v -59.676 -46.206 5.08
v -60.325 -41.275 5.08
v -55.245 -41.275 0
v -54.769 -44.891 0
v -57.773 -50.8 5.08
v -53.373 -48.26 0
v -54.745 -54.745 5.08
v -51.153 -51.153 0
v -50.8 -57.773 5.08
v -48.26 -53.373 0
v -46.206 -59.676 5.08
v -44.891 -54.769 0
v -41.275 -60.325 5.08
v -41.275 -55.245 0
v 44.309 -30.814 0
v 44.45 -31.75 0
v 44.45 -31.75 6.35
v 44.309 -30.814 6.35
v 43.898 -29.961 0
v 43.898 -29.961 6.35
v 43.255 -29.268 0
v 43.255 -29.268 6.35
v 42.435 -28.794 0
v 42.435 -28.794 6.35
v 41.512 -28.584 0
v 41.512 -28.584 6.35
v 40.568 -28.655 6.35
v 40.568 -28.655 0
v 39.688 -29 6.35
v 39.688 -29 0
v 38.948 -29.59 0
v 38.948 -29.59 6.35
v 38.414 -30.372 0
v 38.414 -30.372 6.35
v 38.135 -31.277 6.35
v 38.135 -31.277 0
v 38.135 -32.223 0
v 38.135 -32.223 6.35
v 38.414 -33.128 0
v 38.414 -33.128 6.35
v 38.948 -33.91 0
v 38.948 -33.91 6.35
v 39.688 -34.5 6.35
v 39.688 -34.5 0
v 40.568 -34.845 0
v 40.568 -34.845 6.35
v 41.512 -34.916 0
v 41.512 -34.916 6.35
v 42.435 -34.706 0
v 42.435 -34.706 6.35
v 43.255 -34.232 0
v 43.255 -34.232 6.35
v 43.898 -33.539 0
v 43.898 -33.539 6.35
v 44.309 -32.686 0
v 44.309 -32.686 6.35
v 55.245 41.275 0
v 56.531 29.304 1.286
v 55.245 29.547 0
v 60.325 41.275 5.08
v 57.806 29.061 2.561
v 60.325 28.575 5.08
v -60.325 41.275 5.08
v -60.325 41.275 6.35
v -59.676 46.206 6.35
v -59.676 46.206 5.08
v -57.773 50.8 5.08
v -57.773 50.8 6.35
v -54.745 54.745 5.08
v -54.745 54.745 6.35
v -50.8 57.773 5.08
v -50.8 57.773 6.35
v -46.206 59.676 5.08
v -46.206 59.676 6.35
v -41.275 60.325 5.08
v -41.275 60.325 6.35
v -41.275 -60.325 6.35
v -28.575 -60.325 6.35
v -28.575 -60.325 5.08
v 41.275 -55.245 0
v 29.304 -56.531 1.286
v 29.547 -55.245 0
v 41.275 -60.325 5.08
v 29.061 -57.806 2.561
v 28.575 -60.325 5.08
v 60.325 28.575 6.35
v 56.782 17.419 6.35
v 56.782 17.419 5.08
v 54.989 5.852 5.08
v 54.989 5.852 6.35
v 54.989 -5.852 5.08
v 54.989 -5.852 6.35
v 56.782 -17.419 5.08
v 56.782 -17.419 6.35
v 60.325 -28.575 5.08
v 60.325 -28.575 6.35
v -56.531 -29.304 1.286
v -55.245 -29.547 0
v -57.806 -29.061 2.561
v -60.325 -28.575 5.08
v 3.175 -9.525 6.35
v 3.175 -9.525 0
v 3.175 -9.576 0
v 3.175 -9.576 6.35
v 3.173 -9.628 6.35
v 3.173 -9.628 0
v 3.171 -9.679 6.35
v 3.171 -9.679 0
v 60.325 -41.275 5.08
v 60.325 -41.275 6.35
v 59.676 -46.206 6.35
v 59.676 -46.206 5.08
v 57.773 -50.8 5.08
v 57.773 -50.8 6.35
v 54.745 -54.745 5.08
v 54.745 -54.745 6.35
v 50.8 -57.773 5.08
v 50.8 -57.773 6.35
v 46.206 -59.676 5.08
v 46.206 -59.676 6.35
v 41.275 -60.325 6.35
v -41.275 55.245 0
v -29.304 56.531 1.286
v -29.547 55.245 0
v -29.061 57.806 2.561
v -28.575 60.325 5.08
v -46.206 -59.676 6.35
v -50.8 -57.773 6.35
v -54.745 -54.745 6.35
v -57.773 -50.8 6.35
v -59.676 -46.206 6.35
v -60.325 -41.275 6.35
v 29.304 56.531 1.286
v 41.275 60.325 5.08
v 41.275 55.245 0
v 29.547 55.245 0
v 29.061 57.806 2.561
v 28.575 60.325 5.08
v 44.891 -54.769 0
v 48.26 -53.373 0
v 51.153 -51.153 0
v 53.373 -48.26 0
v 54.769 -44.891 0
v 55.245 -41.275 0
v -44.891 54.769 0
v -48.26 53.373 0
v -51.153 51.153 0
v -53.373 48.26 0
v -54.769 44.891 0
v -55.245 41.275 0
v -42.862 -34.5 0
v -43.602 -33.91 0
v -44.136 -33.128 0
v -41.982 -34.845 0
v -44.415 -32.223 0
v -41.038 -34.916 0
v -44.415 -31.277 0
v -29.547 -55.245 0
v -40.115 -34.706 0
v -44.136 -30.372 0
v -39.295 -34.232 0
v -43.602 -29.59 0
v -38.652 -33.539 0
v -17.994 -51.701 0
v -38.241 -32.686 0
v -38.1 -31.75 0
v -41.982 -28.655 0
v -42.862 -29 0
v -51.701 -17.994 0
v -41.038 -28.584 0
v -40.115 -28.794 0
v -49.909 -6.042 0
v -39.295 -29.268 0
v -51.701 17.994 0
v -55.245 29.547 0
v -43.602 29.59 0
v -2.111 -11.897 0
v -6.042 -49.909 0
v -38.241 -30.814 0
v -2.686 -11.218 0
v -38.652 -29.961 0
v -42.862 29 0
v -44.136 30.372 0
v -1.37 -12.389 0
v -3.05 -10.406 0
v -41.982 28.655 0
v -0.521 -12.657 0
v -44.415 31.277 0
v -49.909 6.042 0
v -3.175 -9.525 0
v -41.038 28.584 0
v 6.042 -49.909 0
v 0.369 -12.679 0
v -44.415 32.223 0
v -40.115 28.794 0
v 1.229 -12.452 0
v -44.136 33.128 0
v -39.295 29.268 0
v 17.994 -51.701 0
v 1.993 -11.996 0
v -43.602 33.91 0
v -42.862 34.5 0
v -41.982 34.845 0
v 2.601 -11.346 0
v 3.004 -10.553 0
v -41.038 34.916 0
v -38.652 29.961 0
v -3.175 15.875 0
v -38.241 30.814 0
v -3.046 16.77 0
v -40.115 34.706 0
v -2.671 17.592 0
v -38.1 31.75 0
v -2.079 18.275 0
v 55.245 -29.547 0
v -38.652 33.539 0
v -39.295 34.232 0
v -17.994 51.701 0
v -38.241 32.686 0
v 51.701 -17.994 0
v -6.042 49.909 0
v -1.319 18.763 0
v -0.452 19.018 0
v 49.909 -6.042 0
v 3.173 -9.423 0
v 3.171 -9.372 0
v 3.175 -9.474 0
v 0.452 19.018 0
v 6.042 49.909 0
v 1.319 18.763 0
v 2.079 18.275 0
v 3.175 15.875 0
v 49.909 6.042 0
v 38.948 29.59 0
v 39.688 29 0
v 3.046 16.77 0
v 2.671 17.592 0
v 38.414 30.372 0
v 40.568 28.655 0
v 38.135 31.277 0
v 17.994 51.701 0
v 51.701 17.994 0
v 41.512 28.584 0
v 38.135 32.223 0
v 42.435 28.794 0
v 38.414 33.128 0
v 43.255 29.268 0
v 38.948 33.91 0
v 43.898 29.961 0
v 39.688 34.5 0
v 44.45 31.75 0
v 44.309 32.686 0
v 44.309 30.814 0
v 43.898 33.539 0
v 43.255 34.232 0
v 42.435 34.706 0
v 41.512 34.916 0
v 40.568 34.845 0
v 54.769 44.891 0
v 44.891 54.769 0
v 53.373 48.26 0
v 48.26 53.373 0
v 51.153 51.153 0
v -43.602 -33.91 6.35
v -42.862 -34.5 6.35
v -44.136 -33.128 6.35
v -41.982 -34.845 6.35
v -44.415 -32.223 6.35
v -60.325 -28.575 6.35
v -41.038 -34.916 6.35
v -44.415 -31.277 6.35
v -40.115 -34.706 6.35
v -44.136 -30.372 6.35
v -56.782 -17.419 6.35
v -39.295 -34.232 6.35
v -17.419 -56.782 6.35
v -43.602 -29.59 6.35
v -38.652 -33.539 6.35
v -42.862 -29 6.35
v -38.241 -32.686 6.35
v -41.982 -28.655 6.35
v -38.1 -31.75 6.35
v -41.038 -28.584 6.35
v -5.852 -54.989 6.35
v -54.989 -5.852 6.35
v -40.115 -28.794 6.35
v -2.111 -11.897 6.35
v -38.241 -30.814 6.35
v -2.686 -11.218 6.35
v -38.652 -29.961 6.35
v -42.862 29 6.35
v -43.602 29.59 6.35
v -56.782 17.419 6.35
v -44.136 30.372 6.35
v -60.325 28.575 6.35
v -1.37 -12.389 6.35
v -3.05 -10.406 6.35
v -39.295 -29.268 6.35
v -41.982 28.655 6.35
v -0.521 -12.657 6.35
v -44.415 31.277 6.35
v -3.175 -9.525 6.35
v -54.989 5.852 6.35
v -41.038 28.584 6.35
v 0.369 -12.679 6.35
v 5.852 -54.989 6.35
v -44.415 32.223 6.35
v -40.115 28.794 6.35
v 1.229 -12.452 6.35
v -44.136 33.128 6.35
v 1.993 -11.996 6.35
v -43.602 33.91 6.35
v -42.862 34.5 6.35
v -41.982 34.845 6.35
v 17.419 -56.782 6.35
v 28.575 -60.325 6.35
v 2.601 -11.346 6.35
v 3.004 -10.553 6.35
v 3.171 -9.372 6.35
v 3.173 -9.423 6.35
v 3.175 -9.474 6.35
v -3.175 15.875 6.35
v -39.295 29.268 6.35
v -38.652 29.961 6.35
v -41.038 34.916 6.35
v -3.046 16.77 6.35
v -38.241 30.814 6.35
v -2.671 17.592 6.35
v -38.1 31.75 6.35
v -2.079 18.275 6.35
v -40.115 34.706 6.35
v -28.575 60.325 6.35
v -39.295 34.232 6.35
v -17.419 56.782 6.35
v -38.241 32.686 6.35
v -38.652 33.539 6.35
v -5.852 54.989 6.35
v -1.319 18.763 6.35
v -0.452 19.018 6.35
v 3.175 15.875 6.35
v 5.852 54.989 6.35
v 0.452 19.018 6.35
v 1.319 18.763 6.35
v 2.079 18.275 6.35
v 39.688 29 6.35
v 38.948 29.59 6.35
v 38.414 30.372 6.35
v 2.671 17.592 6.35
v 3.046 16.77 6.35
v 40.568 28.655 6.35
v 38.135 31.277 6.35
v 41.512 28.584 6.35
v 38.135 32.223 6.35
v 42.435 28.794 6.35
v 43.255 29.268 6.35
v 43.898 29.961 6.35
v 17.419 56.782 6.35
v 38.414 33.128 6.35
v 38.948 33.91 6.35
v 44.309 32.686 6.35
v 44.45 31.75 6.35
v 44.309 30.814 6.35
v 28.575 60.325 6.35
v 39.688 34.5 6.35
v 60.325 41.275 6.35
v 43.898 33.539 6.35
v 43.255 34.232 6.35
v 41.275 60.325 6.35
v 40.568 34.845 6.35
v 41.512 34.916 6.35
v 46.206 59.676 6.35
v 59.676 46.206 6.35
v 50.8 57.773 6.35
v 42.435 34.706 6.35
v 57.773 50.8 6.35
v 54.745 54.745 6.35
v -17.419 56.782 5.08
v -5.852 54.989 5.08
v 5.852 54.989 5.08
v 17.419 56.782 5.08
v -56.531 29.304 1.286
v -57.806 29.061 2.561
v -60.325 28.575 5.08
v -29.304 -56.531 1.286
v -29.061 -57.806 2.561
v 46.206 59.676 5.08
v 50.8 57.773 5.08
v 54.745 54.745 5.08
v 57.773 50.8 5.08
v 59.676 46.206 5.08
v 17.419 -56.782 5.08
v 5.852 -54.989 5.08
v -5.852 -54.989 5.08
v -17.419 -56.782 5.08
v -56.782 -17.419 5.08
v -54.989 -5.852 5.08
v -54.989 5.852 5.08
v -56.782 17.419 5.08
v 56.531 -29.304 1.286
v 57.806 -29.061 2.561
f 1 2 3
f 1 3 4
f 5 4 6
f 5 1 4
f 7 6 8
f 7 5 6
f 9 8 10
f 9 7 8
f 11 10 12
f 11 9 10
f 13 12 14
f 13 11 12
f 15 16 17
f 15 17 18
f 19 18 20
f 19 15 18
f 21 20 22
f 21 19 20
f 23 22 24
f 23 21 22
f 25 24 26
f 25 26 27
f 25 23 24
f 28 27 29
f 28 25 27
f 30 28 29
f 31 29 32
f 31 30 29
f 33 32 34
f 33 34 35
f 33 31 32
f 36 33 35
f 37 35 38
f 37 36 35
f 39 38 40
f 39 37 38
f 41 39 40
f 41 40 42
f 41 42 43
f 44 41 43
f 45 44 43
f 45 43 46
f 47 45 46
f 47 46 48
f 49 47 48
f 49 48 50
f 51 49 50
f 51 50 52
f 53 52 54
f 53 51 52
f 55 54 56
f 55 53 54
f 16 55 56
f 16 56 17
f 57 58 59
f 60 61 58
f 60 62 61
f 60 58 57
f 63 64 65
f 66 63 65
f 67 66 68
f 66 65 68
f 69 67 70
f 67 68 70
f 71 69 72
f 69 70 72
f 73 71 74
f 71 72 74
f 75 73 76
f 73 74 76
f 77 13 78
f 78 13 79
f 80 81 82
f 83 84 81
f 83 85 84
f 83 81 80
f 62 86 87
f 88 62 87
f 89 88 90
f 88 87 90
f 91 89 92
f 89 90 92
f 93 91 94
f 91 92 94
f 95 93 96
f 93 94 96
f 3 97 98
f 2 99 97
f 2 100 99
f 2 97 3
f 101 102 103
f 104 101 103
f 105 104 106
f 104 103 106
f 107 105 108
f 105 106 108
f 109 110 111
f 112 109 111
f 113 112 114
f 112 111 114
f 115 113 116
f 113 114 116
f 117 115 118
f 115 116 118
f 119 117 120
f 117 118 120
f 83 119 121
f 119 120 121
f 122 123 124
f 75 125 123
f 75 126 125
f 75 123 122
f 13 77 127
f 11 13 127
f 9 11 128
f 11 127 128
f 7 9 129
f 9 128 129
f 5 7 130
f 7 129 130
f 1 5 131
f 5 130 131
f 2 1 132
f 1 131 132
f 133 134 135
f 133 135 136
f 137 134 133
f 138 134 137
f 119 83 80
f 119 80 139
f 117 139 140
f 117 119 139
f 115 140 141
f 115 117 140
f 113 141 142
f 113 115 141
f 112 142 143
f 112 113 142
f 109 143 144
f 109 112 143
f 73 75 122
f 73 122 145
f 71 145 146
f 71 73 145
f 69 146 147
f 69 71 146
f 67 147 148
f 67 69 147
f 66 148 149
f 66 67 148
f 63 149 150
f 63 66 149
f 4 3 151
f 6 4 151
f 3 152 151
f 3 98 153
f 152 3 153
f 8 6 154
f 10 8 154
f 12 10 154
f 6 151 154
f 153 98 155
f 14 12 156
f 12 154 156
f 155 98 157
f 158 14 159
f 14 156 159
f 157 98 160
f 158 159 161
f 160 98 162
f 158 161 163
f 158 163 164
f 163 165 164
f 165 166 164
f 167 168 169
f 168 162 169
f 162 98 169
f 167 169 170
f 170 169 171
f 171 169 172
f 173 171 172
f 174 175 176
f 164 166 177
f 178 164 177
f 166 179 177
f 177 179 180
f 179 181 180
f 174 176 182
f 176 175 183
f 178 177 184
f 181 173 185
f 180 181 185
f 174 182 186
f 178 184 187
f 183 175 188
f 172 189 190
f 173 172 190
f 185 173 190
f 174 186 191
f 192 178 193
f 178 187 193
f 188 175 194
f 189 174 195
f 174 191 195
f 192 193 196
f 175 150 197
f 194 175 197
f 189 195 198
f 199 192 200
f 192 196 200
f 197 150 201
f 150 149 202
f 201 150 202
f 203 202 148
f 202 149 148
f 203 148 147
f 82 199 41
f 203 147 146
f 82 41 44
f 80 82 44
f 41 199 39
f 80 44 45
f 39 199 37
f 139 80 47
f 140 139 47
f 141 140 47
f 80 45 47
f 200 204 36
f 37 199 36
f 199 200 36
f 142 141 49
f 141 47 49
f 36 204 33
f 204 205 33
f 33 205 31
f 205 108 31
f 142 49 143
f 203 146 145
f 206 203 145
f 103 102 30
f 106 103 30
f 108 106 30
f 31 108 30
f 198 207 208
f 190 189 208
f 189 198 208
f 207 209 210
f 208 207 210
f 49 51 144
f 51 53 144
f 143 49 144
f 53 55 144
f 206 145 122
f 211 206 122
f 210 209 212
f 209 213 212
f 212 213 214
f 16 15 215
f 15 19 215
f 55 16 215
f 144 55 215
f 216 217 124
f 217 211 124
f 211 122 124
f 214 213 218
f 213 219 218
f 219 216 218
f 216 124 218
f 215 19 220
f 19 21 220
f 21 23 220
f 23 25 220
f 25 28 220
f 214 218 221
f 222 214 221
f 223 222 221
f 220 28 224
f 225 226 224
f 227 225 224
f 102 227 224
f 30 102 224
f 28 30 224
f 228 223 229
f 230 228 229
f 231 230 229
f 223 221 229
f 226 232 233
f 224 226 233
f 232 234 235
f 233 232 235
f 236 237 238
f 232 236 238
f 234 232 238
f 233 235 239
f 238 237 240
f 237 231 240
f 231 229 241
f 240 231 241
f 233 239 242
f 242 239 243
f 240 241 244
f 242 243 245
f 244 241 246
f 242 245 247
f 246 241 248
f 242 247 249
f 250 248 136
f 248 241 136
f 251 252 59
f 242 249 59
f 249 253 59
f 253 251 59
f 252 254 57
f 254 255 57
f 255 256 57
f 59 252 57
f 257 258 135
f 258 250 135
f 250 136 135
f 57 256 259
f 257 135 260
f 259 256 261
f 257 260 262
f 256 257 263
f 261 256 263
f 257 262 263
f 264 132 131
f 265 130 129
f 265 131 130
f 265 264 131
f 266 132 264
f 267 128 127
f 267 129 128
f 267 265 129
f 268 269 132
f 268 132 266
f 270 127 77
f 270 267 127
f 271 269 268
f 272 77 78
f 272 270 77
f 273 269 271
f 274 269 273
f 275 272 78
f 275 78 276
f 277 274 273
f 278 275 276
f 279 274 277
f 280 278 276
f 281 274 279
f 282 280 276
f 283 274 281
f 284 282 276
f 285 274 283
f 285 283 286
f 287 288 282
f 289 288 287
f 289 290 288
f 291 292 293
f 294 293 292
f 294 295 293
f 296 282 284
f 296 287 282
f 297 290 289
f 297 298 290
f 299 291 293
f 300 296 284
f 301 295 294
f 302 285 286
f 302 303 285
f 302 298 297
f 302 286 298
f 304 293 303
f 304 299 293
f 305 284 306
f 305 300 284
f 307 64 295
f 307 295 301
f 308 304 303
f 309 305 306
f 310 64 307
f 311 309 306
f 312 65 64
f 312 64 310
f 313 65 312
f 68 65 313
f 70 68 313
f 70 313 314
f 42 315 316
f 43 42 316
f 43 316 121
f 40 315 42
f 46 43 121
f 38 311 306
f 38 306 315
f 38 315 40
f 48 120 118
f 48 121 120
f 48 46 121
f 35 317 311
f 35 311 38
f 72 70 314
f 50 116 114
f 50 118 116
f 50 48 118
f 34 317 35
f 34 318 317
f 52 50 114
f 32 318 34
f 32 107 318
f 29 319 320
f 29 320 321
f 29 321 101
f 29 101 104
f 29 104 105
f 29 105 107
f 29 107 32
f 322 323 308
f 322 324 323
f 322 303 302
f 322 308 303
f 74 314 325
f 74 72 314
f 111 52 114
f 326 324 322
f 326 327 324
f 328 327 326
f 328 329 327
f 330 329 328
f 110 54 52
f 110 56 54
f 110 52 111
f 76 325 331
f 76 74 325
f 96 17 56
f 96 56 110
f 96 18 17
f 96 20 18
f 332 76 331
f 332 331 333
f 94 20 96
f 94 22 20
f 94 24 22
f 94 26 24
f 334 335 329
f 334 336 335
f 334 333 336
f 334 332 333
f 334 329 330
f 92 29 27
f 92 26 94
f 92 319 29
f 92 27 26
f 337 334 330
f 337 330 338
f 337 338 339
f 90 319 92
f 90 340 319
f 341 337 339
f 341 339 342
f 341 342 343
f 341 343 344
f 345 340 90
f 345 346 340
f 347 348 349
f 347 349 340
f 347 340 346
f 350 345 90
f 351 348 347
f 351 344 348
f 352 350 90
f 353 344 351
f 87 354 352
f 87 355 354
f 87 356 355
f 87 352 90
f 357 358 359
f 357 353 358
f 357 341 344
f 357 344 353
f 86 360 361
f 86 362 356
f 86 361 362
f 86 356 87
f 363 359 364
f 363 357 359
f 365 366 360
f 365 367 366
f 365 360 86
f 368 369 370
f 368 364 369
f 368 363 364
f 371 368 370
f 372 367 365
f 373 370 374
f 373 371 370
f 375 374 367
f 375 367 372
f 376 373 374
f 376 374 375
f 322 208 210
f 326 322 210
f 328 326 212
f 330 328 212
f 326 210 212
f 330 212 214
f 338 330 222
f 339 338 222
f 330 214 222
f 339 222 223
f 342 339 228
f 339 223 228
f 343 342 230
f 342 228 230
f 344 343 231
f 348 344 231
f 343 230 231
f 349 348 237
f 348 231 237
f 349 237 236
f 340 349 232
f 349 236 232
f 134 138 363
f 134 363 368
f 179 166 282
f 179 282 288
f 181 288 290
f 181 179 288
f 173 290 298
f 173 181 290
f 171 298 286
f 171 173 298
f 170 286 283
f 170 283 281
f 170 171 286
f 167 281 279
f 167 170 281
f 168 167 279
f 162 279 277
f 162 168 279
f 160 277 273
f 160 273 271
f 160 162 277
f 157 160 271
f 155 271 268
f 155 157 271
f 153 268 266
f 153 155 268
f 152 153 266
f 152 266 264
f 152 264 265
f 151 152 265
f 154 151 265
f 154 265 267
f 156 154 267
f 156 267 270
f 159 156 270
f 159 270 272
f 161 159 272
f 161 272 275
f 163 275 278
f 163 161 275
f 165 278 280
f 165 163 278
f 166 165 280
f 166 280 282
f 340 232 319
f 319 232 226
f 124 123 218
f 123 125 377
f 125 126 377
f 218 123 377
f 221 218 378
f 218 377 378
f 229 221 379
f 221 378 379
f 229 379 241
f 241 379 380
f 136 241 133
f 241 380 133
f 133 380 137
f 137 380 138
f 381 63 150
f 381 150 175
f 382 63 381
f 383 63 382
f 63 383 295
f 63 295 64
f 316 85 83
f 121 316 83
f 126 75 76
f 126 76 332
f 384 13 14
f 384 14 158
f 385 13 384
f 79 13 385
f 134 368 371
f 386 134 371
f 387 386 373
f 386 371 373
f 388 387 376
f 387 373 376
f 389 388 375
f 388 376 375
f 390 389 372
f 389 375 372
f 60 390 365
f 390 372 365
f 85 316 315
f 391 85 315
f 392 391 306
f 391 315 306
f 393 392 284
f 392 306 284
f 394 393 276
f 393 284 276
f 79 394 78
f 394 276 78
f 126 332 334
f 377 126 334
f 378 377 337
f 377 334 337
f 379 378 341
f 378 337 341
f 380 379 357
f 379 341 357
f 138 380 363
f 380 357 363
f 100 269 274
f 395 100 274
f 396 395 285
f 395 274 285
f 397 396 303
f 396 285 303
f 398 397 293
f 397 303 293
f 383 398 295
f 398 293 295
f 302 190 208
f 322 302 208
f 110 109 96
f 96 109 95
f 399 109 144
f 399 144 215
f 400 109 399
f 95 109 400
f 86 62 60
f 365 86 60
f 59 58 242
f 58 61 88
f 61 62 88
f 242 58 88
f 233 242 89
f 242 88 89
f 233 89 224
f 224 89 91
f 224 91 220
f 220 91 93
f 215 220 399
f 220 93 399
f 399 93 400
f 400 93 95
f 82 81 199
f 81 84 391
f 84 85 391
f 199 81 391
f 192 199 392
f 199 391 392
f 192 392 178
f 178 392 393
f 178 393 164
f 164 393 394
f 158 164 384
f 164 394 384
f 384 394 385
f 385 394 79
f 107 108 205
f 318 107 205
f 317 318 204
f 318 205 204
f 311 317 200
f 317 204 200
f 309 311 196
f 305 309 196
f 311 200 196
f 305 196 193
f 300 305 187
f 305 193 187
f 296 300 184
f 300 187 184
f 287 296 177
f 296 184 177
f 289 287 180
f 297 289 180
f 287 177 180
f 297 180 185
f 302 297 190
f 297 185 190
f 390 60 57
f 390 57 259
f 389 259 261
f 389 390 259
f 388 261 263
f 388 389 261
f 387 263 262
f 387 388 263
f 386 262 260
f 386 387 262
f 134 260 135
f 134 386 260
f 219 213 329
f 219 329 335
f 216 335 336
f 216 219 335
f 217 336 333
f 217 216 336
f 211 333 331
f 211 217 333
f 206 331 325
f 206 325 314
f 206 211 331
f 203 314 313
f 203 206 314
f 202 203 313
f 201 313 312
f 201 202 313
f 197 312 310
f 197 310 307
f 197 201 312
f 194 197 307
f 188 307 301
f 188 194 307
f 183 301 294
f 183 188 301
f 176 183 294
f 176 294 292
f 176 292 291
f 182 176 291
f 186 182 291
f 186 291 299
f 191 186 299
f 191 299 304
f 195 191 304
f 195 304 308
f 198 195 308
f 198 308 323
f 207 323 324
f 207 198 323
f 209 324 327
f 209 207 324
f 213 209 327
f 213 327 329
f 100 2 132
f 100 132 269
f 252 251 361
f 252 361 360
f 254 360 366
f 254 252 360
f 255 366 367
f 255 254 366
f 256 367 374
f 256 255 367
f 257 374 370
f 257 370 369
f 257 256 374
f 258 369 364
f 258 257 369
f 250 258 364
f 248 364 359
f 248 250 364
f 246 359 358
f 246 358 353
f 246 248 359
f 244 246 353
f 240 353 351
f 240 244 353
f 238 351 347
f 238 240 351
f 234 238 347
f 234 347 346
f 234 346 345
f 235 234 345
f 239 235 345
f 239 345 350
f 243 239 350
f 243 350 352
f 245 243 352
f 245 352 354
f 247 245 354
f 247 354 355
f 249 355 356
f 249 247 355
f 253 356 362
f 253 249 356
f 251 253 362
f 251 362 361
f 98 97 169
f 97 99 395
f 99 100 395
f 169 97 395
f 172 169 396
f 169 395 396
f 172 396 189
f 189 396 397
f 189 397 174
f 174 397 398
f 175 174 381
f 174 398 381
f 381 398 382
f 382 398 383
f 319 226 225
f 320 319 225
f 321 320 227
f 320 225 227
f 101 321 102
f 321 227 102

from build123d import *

# Parameters (mm, degrees)
F0_W     = 120.65
F0_H     = 120.65
F0_R     = 3.175
F1_DEPTH = 6.35
F4_DEPTH = 25.4
F5_R     = 3.175
F6_DEPTH = 25.4
F7_SIZE  = 5.08


# Not quite as in the source:
# - a feature of the source that left no trace in its solid (it failed there, or was rolled back) is left out


with BuildPart() as f1:
    # F0 (on Top) → F1 (new body)
    with BuildSketch(Plane.XY):
        Rectangle(F0_W, F0_H)
        with Locations((-41.275, -31.75)):
            Circle(F0_R, mode=Mode.SUBTRACT)
        with Locations((41.275, -31.75)):
            Circle(F0_R, mode=Mode.SUBTRACT)
        with Locations((-41.275, 31.75)):
            Circle(F0_R, mode=Mode.SUBTRACT)
        with Locations((41.275, 31.75)):
            Circle(F0_R, mode=Mode.SUBTRACT)
    extrude(amount=F1_DEPTH)

    # F2 (on face) → F4 (cut)
    with BuildSketch(Plane(origin=(0, 0, 0), x_dir=(1, 0, 0), z_dir=(0, 0, -1))):
        with BuildLine():
            ThreePointArc((-3.175, -15.875), (0, -19.05), (3.175, -15.875))
            ThreePointArc((3.175, -15.875), (0, -12.7), (-3.175, -15.875))
        make_face()
        with BuildLine():
            ThreePointArc((-3.175, -15.875), (0, -12.7), (3.175, -15.875))
            Line((3.1750000339, -15.875), (3.1713092382, 9.3719551838))
            ThreePointArc((3.1713092382, 9.3719551838), (-0.0765446561, 6.3509228246), (-3.175, 9.525))
            Line((-3.175, 9.525), (-3.175, -15.875))
        make_face()
        with BuildLine():
            Line((3.1712643561, 9.6789720229), (3.1713092382, 9.3719551838))
            ThreePointArc((3.1713092382, 9.3719551838), (3.1740771754, 9.4484553439), (3.175, 9.525))
            ThreePointArc((3.175, 9.525), (3.1740659516, 9.6020086665), (3.1712643561, 9.6789720229))
        make_face()
        with BuildLine():
            ThreePointArc((-3.175, 9.525), (-0.0765446561, 6.3509228246), (3.1713092382, 9.3719551838))
            Line((3.1713092382, 9.3719551838), (3.1712643561, 9.6789720229))
            ThreePointArc((3.1712643561, 9.6789720229), (-0.0770086665, 12.6990659516), (-3.175, 9.525))
        make_face()
    extrude(amount=-F4_DEPTH, mode=Mode.SUBTRACT)

    # F5 (on face) → F6 (cut)
    with BuildSketch(Plane.XY.offset(6.35)):
        with BuildLine():
            ThreePointArc((-28.575, 60.325), (0, 54.7642905896), (28.575, 60.325))
            Line((28.575, 60.325), (-28.575, 60.325))
        make_face()
        with BuildLine():
            Line((-28.575, -60.325), (28.575, -60.325))
            ThreePointArc((28.575, -60.325), (0, -54.7642905896), (-28.575, -60.325))
        make_face()
        with BuildLine():
            Line((60.325, -28.575), (60.325, 28.575))
            ThreePointArc((60.325, 28.575), (54.7642905896, 0), (60.325, -28.575))
        make_face()
        with BuildLine():
            ThreePointArc((-60.325, -28.575), (-54.7642905896, 0), (-60.325, 28.575))
            Line((-60.325, 28.575), (-60.325, -28.575))
        make_face()
        with Locations((41.275, 31.75)):
            Circle(F5_R)
        with Locations((41.275, -31.75)):
            Circle(F5_R)
        with Locations((-41.275, -31.75)):
            Circle(F5_R)
        with Locations((-41.275, 31.75)):
            Circle(F5_R)
        with BuildLine():
            Line((60.325, 60.325), (41.275, 60.325))
            ThreePointArc((41.275, 60.325), (54.7453841816, 54.7453841816), (60.325, 41.275))
            Line((60.325, 41.275), (60.325, 60.325))
        make_face()
        with BuildLine():
            ThreePointArc((-41.275, -60.325), (-54.7453841816, -54.7453841816), (-60.325, -41.275))
            Line((-60.325, -41.275), (-60.325, -60.325))
            Line((-60.325, -60.325), (-41.275, -60.325))
        make_face()
        with BuildLine():
            ThreePointArc((-60.325, 41.275), (-54.7453841816, 54.7453841816), (-41.275, 60.325))
            Line((-41.275, 60.325), (-60.325, 60.325))
            Line((-60.325, 60.325), (-60.325, 41.275))
        make_face()
        with BuildLine():
            Line((60.325, -60.325), (60.325, -41.275))
            ThreePointArc((60.325, -41.275), (54.7453841816, -54.7453841816), (41.275, -60.325))
            Line((41.275, -60.325), (60.325, -60.325))
        make_face()
    extrude(amount=-F6_DEPTH, mode=Mode.SUBTRACT)

    # F7
    f7_edges = [f1.edges().sort_by_distance(p)[0] for p in [
        (0, 54.764291, 0),
        (54.745384, 54.745384, 0),
        (54.764291, 0, 0),
        (54.745384, -54.745384, 0),
        (-34.925, -60.325, 0),
        (0, -54.764291, 0),
        (-54.745384, 54.745384, 0),
        (-60.325, 34.925, 0),
        (-54.764291, 0, 0),
        (-54.745384, -54.745384, 0),
        (-60.325, -34.925, 0),
        (-34.925, 60.325, 0),
        (34.925, 60.325, 0),
        (60.325, 34.925, 0),
        (60.325, -34.925, 0),
        (34.925, -60.325, 0),
    ]]
    chamfer(f7_edges, length=F7_SIZE)


solid = f1.part
